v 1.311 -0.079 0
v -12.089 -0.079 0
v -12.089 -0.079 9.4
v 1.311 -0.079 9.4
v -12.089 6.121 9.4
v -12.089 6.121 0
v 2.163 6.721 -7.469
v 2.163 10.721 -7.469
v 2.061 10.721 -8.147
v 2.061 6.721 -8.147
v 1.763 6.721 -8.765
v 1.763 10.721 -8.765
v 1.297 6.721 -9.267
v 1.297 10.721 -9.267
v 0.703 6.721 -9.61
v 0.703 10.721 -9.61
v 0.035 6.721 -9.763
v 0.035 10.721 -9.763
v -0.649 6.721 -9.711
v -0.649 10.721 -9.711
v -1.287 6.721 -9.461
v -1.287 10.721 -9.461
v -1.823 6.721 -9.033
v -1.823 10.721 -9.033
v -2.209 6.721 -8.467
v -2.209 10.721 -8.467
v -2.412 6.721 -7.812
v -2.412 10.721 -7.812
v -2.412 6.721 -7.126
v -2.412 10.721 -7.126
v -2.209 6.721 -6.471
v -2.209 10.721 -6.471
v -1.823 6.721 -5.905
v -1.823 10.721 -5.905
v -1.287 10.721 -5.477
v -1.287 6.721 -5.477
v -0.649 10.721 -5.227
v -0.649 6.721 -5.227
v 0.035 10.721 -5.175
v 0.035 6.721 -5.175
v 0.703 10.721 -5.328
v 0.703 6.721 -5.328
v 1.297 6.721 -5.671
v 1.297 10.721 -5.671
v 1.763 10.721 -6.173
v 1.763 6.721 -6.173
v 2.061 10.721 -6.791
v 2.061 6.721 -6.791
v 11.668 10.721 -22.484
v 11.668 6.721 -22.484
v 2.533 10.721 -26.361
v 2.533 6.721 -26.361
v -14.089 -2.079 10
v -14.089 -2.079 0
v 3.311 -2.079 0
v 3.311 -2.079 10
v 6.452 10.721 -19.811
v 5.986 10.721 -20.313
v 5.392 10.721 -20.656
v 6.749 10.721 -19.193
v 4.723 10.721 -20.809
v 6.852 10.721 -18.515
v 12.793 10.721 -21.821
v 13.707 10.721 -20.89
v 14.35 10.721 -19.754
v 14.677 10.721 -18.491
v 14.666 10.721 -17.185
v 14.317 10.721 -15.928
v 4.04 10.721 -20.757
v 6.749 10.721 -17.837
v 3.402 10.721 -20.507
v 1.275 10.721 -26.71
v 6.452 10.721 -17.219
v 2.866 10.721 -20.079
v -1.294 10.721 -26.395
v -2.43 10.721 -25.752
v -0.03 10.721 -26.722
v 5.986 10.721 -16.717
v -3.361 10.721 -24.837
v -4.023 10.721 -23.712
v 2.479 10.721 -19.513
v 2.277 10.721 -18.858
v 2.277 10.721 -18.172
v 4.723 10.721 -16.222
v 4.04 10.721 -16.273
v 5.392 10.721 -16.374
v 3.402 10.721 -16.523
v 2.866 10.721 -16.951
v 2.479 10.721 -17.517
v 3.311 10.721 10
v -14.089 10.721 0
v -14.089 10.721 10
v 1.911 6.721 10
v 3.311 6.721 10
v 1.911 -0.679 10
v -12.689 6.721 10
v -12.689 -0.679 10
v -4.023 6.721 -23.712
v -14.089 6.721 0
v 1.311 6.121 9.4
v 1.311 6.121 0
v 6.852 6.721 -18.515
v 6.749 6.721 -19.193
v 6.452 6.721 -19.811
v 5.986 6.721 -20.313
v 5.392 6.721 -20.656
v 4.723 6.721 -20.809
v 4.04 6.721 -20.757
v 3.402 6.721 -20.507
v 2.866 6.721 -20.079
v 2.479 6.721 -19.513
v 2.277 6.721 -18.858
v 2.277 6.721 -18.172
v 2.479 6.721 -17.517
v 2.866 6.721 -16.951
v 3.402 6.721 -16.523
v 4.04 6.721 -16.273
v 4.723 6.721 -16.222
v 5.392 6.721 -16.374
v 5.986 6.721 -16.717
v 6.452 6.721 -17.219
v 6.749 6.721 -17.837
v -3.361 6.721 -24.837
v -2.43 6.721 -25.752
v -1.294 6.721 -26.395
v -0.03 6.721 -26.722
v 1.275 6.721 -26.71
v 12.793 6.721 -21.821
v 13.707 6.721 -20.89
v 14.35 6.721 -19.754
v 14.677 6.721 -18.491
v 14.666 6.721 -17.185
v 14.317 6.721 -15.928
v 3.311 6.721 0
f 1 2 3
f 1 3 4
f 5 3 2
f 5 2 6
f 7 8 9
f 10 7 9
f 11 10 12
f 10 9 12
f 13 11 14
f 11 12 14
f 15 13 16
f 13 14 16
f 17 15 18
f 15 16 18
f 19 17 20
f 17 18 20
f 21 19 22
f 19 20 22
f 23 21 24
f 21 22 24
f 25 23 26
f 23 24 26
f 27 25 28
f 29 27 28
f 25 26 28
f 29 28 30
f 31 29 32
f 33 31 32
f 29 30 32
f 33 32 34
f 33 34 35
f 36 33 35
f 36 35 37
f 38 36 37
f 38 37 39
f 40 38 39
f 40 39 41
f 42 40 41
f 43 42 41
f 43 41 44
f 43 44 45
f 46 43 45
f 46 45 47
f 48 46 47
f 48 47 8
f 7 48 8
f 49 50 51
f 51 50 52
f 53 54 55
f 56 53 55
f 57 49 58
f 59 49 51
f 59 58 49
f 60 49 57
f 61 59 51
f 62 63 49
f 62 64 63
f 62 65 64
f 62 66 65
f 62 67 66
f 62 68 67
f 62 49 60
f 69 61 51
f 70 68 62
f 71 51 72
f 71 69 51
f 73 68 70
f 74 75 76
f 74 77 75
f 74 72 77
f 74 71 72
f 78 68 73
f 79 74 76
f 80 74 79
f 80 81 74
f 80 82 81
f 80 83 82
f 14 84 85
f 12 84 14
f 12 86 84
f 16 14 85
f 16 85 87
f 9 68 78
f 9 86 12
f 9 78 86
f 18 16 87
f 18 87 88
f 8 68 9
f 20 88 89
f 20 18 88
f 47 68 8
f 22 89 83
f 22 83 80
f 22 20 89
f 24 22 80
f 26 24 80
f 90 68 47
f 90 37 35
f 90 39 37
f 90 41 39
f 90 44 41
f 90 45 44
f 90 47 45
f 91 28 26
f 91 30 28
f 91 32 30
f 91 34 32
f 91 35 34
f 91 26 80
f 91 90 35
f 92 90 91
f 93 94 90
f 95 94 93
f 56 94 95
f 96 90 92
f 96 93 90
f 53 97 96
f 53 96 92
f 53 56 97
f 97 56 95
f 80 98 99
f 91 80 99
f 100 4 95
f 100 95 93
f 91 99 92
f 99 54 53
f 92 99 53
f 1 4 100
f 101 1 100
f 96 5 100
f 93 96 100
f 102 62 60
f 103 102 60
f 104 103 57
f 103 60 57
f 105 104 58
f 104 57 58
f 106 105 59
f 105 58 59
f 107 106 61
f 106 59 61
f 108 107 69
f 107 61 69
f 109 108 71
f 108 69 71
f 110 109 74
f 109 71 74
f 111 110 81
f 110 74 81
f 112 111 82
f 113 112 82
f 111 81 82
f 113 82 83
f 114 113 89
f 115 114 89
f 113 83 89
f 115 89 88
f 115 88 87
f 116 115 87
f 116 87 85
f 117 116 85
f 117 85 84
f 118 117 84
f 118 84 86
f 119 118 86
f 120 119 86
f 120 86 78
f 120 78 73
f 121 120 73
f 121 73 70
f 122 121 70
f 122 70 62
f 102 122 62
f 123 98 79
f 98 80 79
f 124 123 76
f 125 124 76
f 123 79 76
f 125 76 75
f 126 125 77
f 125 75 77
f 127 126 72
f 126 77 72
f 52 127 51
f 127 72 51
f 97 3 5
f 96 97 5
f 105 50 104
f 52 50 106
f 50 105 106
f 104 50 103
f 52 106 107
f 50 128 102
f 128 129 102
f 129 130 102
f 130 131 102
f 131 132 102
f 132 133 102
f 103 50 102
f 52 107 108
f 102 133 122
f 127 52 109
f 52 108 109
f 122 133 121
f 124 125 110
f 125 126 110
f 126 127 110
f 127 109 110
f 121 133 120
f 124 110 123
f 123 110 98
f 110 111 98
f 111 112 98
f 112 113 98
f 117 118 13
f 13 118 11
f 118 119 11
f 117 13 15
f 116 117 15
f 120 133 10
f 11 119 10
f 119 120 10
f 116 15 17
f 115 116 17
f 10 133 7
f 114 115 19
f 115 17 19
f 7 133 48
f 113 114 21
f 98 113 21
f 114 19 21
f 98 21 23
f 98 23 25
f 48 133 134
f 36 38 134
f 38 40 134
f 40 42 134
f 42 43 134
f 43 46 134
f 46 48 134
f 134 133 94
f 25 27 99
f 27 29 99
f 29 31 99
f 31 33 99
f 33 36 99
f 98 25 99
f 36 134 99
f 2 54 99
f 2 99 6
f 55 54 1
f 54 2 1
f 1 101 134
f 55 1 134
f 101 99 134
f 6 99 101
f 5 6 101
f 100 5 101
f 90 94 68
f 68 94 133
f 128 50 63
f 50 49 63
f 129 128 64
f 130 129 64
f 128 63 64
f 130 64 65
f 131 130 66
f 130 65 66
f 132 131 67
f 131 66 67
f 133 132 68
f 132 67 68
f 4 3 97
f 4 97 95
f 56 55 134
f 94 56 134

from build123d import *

# Parameters (mm, degrees)
F0_W     = 17.4
F0_H     = 8.8
F0_W_2   = 13.4
F0_H_2   = 6.2
F1_DEPTH = 10
F2_W     = 17.4
F2_H     = 10
F3_DEPTH = 4
F4_D     = 4.6
F4_DEPTH = 10
F4_TIP   = 1.3819794238
F5_R     = 5
F6_SIZE  = 0.6


# Not quite as in the source:
# - a feature names something its author has since deleted; it is built from what else it names


with BuildPart() as f1:
    # F0 (on Top) → F1 (new body)
    with BuildSketch(Plane.XY):
        with Locations((-5.3887722373, 2.3212898893)):
            Rectangle(F0_W, F0_H)
        with Locations((-5.3887722373, 3.0212898893)):
            Rectangle(F0_W_2, F0_H_2, mode=Mode.SUBTRACT)
    extrude(amount=F1_DEPTH)

    # F2 (on face) → F3 (join)
    with BuildSketch(Plane(origin=(0, 6.7212898893, 0), x_dir=(-1, 0, 0), z_dir=(0, 1, 0))):
        with Locations((5.3887722373, 5)):
            Rectangle(F2_W, F2_H)
        Polygon((-3.3112277627, 0), (-3.3112277627, 10), (-16.2704663397, -20.530052861), (2.069760485, -28.3150172716), (14.0887722373, 0), align=None)
    extrude(amount=F3_DEPTH)

    # F4
    with Locations(Plane(origin=(0, 6.7212898893, 0), x_dir=(-1, 0, 0), z_dir=(0, -1, 0))):
        with Locations((0.1372122432, 7.4690311061), (-4.5515612986, 18.5150893475)):
            Hole(F4_D / 2, depth=F4_DEPTH)
            with Locations((0, 0, -(F4_DEPTH + F4_TIP / 2))):  # 118° drill point
                Cone(0, F4_D / 2, F4_TIP, mode=Mode.SUBTRACT)

    # F5
    f5_edges = [f1.edges().sort_by_distance(p)[0] for p in [
        (16.270466, 8.72129, -20.530053),
        (-2.06976, 8.72129, -28.315017),
    ]]
    fillet(f5_edges, radius=F5_R)

    # F6
    f6_edges = [f1.edges().sort_by_distance(p)[0] for p in [
        (-5.388772, 6.12129, 10),
        (1.311228, 3.02129, 10),
        (-12.088772, 3.02129, 10),
        (-5.388772, -0.07871, 10),
    ]]
    chamfer(f6_edges, length=F6_SIZE)


solid = f1.part
